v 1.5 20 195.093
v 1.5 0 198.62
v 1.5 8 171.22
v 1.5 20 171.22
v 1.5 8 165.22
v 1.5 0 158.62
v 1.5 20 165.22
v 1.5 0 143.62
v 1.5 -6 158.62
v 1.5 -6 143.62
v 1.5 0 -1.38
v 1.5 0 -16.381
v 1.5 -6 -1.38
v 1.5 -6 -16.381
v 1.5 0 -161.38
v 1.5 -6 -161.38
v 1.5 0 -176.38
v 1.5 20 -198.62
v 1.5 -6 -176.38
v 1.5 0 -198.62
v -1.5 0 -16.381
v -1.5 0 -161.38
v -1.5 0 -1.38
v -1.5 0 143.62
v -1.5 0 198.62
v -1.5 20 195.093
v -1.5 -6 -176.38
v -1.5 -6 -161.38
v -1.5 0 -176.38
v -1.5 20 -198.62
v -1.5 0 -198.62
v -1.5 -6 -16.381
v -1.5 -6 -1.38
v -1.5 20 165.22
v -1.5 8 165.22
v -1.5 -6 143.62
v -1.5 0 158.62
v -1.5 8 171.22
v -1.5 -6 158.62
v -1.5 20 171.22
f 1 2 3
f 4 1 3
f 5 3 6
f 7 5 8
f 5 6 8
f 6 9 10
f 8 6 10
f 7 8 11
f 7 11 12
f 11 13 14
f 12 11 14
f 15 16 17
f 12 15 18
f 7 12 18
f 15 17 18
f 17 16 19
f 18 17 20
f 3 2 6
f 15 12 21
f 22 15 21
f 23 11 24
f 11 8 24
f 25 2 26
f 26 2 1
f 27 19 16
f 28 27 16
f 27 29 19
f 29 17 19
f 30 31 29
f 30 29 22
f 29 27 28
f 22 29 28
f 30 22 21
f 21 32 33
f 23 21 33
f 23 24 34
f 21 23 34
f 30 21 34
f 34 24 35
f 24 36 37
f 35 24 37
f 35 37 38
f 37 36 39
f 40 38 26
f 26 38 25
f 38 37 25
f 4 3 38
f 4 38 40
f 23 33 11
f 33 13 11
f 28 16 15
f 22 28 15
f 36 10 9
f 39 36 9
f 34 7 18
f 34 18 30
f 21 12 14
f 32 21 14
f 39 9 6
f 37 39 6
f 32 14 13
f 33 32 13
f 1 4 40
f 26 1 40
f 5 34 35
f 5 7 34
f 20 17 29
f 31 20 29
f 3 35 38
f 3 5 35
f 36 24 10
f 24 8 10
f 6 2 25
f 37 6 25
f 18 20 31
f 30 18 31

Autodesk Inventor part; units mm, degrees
ref_plane "YZ Plane" through (0, 0, 0) normal (1, 0, 0) x (0, 1, 0)
ref_plane "XZ Plane" through (0, 0, 0) normal (0, 1, 0) x (-1, 0, 0)
ref_plane "XY Plane" through (0, 0, 0) normal (0, 0, 1) x (1, 0, 0)
sketch "Sketch2" plane through (0, 0, 0) normal (0, 1, 0) x (-1, 0, 0)
  line L0 (-1.5, -198.6195) -> (1.5, -198.6195)
  line L1 (1.5, -198.6195) -> (1.5, 198.6195)
  line L2 (1.5, 198.6195) -> (-1.5, 198.6195)
  line L3 (-1.5, 198.6195) -> (-1.5, -198.6195)
  line L4 (-1.5, -198.6195) -> (1.5, 198.6195) construction
  line L5 (1.5, -198.6195) -> (-1.5, 198.6195) construction
  point P0 (0, 0)
  dimension "d0" = 3
  dimension "d1" = 397.239
extrude "Extrusion1" add sketch "Sketch2" along normal blind 20
sketch "Sketch4" plane through (1.5, 0, -198.6195) normal (1, 0, 0) x (0, 0, -1)
  line L0 (0, 0) -> (-397.239, 0) projected
  line L1 (-397.239, 0) -> (-397.239, 20) projected
  line L2 (-397.239, 0) -> (-397.239, 20)
  line L3 (-397.239, 20) -> (-393.7125, 20)
  line L4 (-397.239, 20) -> (0, 20) projected
  line L5 (-397.239, 0) -> (-393.7125, 20)
  point P0 (-198.6195, 0)
  point P1 (-329.239, 0)
  dimension "d10" = 10
extrude "Extrusion3" cut sketch "Sketch4" against normal through all
sketch "Sketch6" plane through (1.5, 0, -198.6195) normal (1, 0, 0) x (0, 0, -1)
  line L0 (-393.7125, 20) -> (0, 20) projected
  line L1 (-369.839, 20) -> (-363.839, 20)
  line L2 (-363.839, 20) -> (-363.839, 8)
  line L3 (-363.839, 8) -> (-369.839, 8)
  line L4 (-369.839, 8) -> (-369.839, 20)
  line L5 (-397.239, 0) -> (0, 0) construction
  line L6 (-397.239, 0) -> (-397.239, 30) construction
  point P0 (-198.6195, 0)
  dimension "d20" = 6
  dimension "d21" = 12
  dimension "d25" = 27.4
extrude "Extrusion5" cut sketch "Sketch6" against normal blind 6
sketch "Sketch7" plane through (1.5, 0, -198.6195) normal (1, 0, 0) x (0, 0, -1)
  line L0 (0, 0) -> (-397.239, 0) projected
  line L1 (-357.239, 0) -> (-342.239, 0)
  line L2 (-342.239, 0) -> (-342.239, -6)
  line L3 (-342.239, -6) -> (-357.239, -6)
  line L4 (-357.239, -6) -> (-357.239, 0)
  line L5 (-197.239, 0) -> (-182.239, 0)
  line L6 (-182.239, 0) -> (-182.239, -6)
  line L7 (-182.239, -6) -> (-197.239, -6)
  line L8 (-197.239, -6) -> (-197.239, 0)
  line L9 (-37.239, 0) -> (-22.239, 0)
  line L10 (-22.239, 0) -> (-22.239, -6)
  line L11 (-22.239, -6) -> (-37.239, -6)
  line L12 (-37.239, -6) -> (-37.239, 0)
  point P0 (-198.6195, 0)
  dimension "d26" = 15
  dimension "d27" = 6
  dimension "d28" = 15
  dimension "d29" = 15
  dimension "d30" = 6
  dimension "d31" = 40
  dimension "d32" = 145
  dimension "d33" = 145
extrude "Extrusion6" add sketch "Sketch7" against normal blind 3
properties part number "wall outer plunger"
